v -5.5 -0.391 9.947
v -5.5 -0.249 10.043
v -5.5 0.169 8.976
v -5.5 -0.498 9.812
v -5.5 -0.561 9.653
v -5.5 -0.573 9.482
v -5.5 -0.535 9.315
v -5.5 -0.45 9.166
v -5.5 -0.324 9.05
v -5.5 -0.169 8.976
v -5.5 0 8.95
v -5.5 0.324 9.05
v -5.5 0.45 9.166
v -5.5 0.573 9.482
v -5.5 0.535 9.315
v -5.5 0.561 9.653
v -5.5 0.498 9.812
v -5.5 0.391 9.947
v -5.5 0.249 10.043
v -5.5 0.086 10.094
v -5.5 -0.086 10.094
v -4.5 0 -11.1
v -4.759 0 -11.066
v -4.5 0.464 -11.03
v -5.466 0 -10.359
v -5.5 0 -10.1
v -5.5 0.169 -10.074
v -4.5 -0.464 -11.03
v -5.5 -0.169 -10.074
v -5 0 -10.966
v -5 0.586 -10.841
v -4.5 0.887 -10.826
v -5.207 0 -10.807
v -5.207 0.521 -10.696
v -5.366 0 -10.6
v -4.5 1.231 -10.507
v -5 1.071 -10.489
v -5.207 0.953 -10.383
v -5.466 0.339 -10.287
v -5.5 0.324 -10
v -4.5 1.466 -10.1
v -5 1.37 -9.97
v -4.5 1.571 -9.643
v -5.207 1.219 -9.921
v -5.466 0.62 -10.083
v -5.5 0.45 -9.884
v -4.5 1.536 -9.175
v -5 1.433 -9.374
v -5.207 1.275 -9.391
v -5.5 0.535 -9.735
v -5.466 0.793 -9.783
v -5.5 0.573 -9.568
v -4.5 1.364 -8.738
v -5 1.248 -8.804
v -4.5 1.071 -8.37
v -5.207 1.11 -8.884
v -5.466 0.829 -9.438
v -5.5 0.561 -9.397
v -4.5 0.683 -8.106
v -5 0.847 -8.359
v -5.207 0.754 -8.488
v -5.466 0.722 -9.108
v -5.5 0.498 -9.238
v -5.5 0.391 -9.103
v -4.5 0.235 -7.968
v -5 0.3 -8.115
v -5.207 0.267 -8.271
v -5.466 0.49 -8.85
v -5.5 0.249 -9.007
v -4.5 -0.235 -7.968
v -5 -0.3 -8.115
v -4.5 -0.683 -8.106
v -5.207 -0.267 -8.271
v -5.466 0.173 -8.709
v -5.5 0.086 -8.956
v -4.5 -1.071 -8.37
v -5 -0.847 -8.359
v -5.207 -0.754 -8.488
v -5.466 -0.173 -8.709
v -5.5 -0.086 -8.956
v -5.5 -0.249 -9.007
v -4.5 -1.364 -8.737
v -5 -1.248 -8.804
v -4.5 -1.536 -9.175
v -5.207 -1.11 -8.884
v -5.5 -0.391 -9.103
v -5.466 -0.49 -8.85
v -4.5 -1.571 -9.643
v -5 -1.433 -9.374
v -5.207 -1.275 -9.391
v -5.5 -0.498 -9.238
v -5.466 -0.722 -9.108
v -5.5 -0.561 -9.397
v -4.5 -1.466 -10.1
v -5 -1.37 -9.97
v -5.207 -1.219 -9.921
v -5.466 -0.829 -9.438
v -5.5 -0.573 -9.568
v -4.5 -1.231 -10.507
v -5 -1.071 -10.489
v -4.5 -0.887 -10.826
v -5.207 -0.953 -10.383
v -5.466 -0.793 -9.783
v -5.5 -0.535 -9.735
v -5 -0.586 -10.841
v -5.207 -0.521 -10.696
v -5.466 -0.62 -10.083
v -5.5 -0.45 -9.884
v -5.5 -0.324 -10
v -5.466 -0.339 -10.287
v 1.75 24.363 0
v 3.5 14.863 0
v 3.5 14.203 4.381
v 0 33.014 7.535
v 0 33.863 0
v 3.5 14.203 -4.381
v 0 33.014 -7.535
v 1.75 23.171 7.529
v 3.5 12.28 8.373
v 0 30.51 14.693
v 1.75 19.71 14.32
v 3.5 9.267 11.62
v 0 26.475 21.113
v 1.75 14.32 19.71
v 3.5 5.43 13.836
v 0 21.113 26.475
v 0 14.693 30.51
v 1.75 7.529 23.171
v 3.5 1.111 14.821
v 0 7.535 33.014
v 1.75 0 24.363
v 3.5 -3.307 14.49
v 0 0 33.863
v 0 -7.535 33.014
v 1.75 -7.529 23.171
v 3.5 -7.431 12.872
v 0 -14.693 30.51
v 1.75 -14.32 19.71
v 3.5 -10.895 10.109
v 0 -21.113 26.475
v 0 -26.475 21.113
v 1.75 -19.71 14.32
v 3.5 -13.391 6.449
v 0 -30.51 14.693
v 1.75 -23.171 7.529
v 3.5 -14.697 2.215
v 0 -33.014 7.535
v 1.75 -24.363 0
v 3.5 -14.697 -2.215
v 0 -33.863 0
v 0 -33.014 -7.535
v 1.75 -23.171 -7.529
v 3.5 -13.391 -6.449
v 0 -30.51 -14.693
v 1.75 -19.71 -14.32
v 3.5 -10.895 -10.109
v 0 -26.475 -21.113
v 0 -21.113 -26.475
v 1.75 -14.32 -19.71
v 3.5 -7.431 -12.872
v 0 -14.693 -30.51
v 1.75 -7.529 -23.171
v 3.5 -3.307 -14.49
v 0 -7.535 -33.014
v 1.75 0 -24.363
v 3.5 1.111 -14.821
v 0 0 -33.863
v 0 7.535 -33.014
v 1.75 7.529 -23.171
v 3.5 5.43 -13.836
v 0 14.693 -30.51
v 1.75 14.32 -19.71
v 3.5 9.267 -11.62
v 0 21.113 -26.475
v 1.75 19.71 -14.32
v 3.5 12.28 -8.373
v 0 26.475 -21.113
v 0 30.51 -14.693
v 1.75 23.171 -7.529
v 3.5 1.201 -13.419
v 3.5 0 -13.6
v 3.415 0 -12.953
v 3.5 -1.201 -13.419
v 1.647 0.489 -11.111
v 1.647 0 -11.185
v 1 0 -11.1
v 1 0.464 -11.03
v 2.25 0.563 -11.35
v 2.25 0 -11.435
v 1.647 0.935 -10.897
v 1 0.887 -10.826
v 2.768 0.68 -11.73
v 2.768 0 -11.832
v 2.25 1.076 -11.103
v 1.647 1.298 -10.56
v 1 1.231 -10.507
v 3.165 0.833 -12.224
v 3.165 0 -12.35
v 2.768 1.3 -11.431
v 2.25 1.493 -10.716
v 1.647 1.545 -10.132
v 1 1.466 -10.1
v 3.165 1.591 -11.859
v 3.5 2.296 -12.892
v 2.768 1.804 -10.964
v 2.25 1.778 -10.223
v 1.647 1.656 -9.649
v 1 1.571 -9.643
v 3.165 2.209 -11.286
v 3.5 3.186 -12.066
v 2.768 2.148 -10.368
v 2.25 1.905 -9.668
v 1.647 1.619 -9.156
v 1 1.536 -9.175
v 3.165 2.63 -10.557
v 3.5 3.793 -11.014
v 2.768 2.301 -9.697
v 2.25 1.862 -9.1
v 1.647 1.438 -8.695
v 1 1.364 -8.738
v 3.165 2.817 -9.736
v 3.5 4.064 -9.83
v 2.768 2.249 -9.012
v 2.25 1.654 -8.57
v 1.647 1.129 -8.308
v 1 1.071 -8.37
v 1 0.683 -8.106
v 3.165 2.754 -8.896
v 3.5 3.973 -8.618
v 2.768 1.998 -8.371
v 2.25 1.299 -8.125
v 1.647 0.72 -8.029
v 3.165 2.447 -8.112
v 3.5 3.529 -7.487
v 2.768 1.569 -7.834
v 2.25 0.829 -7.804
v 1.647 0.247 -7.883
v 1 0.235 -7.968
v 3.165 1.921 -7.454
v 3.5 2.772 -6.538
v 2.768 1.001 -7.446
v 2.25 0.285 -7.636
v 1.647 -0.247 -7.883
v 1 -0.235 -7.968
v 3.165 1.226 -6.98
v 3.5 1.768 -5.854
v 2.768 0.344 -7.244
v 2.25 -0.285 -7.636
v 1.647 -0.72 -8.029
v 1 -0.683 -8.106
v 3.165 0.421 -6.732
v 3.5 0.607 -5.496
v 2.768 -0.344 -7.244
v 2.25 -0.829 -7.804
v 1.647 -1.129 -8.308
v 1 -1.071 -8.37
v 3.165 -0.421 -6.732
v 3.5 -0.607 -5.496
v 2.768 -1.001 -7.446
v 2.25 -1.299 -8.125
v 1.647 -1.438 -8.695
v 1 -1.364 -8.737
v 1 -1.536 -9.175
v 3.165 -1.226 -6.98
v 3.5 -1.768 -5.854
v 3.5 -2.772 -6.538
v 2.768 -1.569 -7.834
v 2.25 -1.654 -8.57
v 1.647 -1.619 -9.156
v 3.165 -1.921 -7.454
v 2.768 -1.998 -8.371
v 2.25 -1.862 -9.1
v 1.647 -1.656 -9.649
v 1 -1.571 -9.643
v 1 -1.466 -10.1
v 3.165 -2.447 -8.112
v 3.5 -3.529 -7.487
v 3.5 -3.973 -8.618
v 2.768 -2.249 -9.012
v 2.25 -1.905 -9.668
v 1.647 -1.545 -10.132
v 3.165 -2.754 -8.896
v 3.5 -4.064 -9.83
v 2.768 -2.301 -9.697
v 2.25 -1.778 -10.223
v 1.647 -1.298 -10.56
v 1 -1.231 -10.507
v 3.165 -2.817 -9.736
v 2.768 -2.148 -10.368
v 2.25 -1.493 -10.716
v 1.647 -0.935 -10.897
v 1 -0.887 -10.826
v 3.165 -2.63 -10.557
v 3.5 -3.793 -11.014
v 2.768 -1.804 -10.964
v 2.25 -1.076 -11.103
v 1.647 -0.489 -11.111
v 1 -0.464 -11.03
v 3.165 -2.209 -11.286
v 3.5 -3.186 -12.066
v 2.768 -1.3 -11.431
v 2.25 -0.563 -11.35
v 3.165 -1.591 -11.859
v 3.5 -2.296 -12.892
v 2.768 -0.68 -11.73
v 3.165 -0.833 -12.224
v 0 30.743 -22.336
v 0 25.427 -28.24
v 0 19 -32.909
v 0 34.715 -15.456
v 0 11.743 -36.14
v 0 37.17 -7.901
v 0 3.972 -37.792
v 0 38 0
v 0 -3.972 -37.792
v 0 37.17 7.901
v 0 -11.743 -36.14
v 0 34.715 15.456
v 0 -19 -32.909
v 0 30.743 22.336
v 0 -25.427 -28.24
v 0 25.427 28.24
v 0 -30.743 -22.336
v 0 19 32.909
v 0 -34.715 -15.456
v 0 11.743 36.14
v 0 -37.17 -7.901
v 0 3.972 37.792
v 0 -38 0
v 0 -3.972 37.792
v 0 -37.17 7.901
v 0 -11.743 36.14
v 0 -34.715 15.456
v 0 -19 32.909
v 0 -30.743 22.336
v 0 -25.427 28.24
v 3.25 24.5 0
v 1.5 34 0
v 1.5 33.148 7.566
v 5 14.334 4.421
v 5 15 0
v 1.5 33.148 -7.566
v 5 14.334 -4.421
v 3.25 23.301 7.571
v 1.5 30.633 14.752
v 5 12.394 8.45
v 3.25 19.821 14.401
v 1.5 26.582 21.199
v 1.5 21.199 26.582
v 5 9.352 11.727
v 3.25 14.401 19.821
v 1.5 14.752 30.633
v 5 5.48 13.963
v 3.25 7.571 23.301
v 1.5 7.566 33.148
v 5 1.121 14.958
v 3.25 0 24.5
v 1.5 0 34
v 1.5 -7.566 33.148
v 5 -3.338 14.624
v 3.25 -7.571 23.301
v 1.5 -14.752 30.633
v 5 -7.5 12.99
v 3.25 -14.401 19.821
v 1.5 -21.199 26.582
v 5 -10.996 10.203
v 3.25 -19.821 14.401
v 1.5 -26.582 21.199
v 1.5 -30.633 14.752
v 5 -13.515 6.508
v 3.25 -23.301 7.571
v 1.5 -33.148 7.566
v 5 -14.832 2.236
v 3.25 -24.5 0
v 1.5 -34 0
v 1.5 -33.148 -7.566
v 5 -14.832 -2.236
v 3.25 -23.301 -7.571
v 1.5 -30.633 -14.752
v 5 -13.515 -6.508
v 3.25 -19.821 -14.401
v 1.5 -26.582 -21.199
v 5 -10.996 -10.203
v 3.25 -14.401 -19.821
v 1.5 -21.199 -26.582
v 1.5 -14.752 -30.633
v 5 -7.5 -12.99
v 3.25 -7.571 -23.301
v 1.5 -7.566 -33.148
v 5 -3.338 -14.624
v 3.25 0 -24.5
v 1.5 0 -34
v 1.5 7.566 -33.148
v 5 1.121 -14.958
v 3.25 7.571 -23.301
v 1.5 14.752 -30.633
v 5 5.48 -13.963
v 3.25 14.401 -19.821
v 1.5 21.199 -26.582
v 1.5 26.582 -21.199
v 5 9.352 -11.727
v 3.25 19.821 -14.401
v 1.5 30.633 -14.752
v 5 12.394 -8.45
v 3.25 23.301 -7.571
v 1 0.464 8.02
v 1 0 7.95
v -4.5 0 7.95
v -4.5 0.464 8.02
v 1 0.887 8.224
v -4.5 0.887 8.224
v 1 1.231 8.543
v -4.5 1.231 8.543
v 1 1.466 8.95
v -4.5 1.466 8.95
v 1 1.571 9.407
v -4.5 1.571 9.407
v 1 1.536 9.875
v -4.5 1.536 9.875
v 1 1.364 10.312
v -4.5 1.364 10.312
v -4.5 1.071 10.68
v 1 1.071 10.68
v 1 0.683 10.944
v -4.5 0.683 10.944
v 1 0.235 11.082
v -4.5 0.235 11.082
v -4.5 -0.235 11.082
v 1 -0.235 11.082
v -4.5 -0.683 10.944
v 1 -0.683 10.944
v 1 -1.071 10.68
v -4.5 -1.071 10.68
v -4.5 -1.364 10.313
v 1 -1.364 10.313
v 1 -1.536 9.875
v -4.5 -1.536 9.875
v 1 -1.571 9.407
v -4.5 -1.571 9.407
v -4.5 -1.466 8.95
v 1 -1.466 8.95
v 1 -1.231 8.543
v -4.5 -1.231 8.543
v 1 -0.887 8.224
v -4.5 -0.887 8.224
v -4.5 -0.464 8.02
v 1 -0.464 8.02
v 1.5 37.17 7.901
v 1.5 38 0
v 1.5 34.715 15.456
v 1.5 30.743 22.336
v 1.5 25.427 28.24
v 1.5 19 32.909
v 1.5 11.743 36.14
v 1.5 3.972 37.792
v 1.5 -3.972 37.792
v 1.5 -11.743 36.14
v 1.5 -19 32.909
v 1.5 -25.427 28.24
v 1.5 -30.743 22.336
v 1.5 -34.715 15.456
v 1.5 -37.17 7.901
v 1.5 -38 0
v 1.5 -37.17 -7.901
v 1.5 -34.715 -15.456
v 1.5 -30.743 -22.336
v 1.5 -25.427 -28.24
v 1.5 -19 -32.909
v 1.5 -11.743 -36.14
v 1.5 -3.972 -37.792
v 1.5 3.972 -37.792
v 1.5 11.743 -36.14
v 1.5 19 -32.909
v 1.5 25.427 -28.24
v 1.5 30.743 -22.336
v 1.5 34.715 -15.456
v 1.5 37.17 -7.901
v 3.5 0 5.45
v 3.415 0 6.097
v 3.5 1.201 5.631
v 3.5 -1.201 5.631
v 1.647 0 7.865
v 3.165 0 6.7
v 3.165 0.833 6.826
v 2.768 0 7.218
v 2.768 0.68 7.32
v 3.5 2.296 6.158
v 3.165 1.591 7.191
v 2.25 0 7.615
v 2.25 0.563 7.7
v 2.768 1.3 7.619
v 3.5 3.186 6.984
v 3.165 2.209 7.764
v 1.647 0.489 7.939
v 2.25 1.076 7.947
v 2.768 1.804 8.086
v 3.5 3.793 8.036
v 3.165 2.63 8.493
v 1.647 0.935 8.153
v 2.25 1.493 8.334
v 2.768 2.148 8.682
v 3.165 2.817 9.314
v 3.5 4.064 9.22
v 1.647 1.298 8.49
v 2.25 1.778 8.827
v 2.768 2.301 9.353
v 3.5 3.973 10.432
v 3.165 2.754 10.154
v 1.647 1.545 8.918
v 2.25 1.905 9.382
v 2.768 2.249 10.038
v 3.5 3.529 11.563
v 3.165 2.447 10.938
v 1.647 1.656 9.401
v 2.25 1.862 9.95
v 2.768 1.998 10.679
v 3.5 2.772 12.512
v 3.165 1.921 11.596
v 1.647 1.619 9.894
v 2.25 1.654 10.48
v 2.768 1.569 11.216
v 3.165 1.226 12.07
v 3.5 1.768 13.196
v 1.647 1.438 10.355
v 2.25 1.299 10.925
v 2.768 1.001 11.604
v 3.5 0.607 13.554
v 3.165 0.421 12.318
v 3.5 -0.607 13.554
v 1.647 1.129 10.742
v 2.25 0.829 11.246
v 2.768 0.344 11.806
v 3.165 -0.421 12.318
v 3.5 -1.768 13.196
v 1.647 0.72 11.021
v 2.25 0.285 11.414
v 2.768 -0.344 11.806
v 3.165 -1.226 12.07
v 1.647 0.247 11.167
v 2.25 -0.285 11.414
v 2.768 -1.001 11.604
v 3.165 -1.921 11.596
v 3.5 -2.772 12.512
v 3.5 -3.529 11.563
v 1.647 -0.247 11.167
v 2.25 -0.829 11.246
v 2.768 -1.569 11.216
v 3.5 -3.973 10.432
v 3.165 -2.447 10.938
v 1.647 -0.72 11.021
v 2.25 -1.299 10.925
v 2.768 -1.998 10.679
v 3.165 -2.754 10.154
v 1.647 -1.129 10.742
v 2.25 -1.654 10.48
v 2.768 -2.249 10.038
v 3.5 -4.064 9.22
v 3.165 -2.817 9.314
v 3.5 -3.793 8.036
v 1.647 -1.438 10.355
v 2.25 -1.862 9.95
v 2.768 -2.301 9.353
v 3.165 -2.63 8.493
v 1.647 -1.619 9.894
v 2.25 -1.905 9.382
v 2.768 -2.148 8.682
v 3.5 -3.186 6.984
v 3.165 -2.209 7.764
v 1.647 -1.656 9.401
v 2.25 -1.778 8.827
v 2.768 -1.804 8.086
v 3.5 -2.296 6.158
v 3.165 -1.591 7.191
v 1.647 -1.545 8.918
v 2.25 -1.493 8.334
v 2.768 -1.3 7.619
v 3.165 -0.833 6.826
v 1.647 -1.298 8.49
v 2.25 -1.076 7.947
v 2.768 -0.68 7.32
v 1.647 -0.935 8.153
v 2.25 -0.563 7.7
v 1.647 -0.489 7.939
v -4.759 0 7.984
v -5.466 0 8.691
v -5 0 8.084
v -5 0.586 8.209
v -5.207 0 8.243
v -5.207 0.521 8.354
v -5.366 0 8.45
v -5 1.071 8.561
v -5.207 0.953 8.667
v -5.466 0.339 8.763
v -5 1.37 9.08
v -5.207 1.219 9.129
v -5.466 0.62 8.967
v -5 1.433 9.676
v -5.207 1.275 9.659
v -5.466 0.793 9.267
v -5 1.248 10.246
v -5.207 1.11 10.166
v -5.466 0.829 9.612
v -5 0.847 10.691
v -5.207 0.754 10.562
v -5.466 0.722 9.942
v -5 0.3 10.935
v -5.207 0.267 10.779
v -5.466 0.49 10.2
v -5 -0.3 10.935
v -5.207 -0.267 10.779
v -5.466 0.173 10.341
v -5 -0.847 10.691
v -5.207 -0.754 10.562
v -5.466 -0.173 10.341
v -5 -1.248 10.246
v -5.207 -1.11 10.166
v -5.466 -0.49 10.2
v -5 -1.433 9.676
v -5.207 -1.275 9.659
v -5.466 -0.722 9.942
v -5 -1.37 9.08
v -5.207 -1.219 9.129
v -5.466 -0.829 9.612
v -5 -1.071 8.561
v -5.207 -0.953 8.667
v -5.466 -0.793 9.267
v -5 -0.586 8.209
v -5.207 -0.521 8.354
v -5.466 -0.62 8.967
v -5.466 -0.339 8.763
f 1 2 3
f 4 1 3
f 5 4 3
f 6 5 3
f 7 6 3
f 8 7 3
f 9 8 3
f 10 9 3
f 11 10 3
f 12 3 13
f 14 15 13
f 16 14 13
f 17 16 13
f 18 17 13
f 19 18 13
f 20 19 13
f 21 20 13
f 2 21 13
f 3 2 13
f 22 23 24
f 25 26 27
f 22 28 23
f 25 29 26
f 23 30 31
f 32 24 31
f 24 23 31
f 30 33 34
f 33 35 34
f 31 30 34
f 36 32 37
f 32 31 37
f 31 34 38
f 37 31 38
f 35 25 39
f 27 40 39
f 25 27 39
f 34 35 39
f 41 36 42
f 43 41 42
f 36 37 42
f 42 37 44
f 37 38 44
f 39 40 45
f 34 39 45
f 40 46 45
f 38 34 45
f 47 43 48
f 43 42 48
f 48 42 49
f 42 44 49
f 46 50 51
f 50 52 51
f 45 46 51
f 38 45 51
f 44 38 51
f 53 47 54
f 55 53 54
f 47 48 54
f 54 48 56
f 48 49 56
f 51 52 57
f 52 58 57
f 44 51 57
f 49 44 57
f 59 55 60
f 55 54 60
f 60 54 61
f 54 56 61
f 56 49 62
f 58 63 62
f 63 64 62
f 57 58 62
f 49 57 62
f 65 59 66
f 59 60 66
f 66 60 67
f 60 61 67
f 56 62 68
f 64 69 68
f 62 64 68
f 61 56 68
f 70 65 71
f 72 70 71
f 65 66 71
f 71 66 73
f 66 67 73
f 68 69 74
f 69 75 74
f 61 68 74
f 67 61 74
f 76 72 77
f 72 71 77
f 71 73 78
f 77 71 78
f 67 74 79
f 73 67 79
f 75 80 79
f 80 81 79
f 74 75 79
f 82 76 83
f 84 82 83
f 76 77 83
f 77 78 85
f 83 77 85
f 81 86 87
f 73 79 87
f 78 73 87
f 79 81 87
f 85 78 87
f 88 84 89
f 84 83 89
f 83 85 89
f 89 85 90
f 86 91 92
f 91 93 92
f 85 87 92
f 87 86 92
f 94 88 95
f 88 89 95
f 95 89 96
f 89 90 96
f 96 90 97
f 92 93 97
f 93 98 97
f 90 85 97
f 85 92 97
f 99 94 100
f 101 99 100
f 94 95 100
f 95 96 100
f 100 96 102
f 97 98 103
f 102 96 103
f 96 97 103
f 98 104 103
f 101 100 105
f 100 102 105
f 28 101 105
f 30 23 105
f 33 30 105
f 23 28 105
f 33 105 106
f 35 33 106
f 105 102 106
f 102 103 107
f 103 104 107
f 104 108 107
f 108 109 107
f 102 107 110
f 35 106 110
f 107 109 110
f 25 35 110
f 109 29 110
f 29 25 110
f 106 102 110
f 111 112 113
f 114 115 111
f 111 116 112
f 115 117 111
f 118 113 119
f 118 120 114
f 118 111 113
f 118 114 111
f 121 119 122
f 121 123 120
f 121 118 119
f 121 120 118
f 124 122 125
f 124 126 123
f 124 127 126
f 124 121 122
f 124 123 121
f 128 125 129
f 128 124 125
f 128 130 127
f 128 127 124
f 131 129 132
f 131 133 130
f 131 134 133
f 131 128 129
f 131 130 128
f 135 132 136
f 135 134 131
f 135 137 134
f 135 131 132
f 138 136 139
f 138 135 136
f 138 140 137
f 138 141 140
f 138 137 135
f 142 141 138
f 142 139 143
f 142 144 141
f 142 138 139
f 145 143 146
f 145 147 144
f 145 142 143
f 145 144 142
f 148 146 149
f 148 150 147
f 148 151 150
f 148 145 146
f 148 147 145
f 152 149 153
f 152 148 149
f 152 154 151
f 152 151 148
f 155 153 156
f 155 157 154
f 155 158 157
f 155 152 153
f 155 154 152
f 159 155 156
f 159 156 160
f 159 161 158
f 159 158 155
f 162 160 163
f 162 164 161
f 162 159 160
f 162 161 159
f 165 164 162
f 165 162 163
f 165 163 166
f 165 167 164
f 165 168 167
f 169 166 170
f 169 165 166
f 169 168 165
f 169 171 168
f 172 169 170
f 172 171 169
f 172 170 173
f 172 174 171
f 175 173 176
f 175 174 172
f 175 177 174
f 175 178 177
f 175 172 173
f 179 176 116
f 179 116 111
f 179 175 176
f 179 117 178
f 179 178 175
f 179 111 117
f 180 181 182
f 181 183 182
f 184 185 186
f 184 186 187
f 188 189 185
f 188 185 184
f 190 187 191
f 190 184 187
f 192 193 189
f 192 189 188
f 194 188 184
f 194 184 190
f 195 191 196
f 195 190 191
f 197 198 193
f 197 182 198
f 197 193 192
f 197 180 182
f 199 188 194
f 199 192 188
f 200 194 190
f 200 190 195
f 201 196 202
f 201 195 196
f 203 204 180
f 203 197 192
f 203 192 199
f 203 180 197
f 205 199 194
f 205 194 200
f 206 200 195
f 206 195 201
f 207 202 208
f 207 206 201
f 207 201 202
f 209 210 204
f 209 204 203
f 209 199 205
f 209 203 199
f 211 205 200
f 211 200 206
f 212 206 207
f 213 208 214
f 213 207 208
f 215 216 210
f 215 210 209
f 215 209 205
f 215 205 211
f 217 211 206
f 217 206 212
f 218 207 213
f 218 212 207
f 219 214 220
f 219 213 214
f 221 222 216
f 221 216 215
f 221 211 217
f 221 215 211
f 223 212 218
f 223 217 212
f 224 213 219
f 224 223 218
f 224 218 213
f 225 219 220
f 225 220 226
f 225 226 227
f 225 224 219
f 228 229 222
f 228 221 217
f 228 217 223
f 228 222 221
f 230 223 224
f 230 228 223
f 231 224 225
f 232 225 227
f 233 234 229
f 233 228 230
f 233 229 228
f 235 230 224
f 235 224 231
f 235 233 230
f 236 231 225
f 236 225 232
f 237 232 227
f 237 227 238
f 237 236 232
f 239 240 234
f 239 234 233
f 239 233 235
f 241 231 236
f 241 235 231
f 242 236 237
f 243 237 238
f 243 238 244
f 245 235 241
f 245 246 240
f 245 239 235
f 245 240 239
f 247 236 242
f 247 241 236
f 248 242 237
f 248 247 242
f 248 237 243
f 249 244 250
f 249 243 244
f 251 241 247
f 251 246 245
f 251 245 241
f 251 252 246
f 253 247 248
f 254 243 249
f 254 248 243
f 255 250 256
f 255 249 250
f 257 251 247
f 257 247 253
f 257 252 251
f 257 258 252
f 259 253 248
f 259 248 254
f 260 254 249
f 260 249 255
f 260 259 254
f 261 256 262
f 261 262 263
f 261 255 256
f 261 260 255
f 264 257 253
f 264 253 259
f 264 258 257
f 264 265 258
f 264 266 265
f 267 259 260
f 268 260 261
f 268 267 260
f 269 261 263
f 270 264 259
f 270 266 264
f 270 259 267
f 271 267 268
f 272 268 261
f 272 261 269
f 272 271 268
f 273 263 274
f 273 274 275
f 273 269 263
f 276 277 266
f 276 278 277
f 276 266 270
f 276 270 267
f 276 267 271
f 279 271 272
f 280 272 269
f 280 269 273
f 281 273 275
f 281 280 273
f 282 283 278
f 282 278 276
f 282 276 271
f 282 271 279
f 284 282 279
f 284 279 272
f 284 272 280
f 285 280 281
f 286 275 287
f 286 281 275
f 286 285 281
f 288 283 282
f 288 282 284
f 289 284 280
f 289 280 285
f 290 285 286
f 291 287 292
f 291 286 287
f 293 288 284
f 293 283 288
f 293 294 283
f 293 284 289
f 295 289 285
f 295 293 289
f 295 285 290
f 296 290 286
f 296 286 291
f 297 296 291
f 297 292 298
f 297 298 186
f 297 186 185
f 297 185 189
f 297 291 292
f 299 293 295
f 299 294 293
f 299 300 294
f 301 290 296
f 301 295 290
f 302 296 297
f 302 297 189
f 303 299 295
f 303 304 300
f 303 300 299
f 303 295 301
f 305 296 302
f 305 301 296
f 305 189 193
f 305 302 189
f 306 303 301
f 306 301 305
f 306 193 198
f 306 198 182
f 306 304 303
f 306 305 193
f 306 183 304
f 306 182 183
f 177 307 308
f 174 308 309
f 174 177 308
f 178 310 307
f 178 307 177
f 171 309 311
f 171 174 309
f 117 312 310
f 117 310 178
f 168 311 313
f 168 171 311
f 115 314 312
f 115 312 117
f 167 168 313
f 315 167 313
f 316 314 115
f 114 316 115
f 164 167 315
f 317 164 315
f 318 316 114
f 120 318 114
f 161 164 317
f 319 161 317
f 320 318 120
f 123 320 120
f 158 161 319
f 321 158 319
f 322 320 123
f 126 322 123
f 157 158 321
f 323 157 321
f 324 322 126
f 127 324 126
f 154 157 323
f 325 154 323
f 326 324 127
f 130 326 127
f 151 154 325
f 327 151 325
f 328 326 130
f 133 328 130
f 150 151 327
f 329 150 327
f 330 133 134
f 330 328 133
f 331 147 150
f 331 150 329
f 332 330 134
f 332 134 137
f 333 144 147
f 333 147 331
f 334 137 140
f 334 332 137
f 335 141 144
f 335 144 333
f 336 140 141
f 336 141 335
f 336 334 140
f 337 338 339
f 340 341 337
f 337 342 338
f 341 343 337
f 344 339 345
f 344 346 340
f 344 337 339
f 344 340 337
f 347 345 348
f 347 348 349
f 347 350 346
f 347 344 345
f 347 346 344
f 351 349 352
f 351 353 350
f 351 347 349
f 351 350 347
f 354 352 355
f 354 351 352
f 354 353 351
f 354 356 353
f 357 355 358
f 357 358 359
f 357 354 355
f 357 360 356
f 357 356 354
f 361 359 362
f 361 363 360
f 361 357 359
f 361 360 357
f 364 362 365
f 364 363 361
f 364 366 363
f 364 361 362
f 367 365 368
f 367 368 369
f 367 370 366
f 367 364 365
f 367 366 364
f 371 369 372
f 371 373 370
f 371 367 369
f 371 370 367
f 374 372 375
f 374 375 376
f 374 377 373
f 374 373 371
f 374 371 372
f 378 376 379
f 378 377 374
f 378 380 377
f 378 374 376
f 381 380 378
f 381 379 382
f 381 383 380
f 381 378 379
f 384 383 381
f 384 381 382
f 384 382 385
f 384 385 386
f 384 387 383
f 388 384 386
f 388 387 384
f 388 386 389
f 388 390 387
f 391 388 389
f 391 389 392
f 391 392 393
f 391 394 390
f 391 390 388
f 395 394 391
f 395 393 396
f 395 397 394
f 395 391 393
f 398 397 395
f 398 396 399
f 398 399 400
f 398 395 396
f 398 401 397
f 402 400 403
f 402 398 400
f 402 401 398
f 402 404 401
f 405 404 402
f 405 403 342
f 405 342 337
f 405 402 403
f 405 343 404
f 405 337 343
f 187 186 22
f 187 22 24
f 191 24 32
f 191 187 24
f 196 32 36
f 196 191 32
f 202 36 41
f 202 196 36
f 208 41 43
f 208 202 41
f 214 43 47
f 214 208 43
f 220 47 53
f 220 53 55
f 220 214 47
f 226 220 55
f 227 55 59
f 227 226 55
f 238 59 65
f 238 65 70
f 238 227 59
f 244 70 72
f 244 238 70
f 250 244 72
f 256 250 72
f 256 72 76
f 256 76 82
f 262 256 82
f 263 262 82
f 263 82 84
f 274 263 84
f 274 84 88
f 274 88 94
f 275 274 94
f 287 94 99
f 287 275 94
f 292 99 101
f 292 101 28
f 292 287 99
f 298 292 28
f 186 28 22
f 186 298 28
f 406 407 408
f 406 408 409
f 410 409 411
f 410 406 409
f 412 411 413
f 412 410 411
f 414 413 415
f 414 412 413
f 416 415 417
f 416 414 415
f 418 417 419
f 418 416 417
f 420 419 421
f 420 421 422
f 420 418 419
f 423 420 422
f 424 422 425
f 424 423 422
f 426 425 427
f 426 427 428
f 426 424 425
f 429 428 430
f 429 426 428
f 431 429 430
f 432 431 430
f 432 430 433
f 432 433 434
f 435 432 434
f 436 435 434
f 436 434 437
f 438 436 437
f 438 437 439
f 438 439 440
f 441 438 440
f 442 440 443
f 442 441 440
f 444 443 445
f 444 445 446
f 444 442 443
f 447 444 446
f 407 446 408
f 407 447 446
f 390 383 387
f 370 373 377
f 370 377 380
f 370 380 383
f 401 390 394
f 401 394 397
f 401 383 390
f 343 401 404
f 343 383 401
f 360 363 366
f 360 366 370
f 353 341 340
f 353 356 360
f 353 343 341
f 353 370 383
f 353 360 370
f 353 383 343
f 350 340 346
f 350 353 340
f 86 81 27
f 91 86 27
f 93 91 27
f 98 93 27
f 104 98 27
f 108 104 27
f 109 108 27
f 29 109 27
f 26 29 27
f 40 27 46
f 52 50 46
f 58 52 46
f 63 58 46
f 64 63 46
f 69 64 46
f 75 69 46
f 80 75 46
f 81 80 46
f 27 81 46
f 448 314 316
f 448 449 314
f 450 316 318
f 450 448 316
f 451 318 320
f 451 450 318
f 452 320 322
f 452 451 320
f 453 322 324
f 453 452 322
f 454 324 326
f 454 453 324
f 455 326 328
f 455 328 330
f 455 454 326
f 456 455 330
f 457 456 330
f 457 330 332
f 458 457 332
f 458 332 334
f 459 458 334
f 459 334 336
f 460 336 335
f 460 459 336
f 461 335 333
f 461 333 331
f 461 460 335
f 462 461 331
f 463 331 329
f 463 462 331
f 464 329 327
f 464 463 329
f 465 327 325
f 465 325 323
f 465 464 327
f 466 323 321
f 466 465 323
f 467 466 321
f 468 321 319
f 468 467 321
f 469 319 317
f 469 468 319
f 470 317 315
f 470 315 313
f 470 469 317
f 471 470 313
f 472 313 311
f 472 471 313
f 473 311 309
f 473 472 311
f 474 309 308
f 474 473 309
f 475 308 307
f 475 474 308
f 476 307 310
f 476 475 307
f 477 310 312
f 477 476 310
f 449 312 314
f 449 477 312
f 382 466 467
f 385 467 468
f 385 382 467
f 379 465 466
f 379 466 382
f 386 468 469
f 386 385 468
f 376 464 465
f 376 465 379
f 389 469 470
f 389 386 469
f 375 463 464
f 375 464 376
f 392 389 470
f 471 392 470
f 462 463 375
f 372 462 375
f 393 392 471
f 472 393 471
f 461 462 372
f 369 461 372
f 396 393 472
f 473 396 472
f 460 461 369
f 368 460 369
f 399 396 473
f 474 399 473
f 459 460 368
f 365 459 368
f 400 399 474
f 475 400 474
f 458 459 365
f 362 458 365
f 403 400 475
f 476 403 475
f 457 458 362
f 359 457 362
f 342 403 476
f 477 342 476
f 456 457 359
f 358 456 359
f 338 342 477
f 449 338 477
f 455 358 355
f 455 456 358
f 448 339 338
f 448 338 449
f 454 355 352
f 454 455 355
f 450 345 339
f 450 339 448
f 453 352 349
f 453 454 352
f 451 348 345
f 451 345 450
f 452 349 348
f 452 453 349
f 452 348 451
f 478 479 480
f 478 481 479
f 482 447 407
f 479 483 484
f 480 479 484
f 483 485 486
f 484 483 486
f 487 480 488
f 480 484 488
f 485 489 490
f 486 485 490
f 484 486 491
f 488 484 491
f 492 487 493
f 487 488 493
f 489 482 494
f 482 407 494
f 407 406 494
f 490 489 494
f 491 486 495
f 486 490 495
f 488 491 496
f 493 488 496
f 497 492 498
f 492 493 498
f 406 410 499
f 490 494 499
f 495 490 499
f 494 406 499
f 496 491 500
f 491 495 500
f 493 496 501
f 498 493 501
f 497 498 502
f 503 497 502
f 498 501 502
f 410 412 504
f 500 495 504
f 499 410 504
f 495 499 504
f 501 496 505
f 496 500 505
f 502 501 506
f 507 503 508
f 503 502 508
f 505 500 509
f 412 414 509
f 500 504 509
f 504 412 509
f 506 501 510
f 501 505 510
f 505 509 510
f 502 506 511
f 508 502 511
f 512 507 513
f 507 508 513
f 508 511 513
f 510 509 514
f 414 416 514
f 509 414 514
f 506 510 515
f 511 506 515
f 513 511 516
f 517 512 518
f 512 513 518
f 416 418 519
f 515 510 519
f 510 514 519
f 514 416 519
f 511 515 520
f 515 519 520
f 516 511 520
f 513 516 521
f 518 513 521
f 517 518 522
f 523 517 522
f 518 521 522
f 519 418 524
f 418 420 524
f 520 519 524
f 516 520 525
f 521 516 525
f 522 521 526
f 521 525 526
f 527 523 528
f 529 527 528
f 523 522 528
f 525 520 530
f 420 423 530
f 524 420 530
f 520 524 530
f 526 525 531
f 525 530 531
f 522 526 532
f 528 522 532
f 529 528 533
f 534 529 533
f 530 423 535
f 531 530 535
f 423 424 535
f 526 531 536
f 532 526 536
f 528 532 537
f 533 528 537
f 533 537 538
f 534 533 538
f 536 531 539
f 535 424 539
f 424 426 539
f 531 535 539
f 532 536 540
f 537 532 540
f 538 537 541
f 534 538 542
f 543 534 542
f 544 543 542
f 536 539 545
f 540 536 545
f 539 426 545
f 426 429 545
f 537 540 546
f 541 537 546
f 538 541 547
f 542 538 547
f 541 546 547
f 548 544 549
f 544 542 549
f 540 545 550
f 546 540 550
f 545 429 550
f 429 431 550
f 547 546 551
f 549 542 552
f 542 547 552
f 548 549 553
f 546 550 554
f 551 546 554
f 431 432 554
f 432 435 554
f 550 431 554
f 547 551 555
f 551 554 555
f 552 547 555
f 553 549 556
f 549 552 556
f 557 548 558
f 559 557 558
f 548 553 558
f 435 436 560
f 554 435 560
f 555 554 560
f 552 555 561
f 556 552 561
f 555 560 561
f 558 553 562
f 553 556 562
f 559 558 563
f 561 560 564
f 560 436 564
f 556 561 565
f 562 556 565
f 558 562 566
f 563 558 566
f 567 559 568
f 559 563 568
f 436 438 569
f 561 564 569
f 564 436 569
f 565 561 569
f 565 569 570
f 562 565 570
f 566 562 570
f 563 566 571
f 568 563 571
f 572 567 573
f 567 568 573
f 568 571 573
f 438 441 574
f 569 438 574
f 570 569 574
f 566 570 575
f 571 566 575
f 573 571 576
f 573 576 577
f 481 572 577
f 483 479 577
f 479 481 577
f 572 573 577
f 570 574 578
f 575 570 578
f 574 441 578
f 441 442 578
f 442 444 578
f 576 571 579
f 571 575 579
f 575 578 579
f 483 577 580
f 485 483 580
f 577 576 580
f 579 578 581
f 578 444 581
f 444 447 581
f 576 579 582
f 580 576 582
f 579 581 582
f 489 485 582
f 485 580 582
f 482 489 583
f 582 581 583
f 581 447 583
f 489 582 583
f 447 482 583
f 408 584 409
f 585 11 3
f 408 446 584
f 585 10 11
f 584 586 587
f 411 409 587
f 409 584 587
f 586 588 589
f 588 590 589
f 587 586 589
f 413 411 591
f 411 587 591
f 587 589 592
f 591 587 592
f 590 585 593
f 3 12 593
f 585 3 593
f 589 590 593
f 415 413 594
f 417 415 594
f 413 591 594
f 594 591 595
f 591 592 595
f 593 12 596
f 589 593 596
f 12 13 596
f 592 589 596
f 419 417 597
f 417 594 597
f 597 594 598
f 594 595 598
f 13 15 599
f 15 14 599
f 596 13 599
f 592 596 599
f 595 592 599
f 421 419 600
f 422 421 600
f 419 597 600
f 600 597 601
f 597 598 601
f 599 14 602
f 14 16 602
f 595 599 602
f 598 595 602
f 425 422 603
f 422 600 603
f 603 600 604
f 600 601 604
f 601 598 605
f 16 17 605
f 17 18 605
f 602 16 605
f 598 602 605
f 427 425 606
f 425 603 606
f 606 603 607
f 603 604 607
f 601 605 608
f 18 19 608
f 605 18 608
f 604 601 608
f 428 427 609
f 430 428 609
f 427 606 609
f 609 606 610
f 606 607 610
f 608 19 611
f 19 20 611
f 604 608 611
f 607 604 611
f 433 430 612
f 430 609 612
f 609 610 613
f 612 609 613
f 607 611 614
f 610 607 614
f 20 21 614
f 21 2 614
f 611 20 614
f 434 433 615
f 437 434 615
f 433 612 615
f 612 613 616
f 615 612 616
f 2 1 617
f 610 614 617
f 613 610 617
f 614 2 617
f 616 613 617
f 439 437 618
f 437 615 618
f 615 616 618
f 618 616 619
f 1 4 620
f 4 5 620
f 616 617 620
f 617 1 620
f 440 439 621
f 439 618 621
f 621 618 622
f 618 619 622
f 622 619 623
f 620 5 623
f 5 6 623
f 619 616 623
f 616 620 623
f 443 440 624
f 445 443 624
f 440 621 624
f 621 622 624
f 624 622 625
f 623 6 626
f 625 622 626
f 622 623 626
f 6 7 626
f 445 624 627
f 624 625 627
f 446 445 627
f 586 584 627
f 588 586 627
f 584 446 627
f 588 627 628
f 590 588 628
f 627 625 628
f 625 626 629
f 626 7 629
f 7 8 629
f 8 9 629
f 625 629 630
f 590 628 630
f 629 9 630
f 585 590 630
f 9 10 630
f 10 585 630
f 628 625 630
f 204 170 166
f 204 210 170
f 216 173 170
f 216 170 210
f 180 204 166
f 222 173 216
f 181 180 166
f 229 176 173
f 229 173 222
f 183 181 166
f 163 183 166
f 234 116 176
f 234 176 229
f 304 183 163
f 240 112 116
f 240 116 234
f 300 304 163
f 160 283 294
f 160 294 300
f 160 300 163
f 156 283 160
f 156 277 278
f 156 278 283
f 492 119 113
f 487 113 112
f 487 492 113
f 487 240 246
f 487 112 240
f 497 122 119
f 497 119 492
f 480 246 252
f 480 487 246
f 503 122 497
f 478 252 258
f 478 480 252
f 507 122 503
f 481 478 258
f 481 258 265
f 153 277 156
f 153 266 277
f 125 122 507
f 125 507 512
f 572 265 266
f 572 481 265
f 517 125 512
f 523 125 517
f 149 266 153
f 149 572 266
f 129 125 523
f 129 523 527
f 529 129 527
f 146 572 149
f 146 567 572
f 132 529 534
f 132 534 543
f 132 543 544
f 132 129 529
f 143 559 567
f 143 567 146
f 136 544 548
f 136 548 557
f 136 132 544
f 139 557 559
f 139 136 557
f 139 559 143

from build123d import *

# Parameters (mm, degrees)
AUFSATZ_LINEAR_START            = 3.5
SKIZZE2_R                       = 1.575
AUFSATZ_LINEAR_AUSTRAGEN1_DEPTH = 9
VERRUNDUNG1_R                   = 1
VERRUNDUNG2_R                   = 2.5


with BuildPart() as part:
    # Skizze1 → Rotation1 (revolve)
    with BuildSketch(Plane.XY):
        Polygon((0, 33.862994677), (0, 38), (1.5, 38), (1.5, 34), (5, 15), (5, 0), (3.5, 0), (3.5, 14.862994677), align=None)
    revolve(axis=Axis((0, 0, 0), (1, 0, 0)))

    # Skizze2 → Aufsatz-Linear austragen1 (add)
    with BuildSketch(Plane(origin=(0, 0, 0), x_dir=(0, 0, -1), z_dir=(1, 0, 0)).offset(AUFSATZ_LINEAR_START)):
        with Locations((9.525, 0)):
            Circle(SKIZZE2_R)
        with Locations((-9.525, 0)):
            Circle(SKIZZE2_R)
    extrude(amount=-AUFSATZ_LINEAR_AUSTRAGEN1_DEPTH)

    # Verrundung1
    verrundung1_edges = [part.edges().sort_by_distance(p)[0] for p in [
        (-5.5, 0, -7.95),
        (-5.5, 0, 11.1),
    ]]
    fillet(verrundung1_edges, radius=VERRUNDUNG1_R)

    # Verrundung2
    verrundung2_edges = [part.edges().sort_by_distance(p)[0] for p in [
        (3.5, 0, -7.95),
        (3.5, 0, 11.1),
    ]]
    fillet(verrundung2_edges, radius=VERRUNDUNG2_R)


solid = part.part
